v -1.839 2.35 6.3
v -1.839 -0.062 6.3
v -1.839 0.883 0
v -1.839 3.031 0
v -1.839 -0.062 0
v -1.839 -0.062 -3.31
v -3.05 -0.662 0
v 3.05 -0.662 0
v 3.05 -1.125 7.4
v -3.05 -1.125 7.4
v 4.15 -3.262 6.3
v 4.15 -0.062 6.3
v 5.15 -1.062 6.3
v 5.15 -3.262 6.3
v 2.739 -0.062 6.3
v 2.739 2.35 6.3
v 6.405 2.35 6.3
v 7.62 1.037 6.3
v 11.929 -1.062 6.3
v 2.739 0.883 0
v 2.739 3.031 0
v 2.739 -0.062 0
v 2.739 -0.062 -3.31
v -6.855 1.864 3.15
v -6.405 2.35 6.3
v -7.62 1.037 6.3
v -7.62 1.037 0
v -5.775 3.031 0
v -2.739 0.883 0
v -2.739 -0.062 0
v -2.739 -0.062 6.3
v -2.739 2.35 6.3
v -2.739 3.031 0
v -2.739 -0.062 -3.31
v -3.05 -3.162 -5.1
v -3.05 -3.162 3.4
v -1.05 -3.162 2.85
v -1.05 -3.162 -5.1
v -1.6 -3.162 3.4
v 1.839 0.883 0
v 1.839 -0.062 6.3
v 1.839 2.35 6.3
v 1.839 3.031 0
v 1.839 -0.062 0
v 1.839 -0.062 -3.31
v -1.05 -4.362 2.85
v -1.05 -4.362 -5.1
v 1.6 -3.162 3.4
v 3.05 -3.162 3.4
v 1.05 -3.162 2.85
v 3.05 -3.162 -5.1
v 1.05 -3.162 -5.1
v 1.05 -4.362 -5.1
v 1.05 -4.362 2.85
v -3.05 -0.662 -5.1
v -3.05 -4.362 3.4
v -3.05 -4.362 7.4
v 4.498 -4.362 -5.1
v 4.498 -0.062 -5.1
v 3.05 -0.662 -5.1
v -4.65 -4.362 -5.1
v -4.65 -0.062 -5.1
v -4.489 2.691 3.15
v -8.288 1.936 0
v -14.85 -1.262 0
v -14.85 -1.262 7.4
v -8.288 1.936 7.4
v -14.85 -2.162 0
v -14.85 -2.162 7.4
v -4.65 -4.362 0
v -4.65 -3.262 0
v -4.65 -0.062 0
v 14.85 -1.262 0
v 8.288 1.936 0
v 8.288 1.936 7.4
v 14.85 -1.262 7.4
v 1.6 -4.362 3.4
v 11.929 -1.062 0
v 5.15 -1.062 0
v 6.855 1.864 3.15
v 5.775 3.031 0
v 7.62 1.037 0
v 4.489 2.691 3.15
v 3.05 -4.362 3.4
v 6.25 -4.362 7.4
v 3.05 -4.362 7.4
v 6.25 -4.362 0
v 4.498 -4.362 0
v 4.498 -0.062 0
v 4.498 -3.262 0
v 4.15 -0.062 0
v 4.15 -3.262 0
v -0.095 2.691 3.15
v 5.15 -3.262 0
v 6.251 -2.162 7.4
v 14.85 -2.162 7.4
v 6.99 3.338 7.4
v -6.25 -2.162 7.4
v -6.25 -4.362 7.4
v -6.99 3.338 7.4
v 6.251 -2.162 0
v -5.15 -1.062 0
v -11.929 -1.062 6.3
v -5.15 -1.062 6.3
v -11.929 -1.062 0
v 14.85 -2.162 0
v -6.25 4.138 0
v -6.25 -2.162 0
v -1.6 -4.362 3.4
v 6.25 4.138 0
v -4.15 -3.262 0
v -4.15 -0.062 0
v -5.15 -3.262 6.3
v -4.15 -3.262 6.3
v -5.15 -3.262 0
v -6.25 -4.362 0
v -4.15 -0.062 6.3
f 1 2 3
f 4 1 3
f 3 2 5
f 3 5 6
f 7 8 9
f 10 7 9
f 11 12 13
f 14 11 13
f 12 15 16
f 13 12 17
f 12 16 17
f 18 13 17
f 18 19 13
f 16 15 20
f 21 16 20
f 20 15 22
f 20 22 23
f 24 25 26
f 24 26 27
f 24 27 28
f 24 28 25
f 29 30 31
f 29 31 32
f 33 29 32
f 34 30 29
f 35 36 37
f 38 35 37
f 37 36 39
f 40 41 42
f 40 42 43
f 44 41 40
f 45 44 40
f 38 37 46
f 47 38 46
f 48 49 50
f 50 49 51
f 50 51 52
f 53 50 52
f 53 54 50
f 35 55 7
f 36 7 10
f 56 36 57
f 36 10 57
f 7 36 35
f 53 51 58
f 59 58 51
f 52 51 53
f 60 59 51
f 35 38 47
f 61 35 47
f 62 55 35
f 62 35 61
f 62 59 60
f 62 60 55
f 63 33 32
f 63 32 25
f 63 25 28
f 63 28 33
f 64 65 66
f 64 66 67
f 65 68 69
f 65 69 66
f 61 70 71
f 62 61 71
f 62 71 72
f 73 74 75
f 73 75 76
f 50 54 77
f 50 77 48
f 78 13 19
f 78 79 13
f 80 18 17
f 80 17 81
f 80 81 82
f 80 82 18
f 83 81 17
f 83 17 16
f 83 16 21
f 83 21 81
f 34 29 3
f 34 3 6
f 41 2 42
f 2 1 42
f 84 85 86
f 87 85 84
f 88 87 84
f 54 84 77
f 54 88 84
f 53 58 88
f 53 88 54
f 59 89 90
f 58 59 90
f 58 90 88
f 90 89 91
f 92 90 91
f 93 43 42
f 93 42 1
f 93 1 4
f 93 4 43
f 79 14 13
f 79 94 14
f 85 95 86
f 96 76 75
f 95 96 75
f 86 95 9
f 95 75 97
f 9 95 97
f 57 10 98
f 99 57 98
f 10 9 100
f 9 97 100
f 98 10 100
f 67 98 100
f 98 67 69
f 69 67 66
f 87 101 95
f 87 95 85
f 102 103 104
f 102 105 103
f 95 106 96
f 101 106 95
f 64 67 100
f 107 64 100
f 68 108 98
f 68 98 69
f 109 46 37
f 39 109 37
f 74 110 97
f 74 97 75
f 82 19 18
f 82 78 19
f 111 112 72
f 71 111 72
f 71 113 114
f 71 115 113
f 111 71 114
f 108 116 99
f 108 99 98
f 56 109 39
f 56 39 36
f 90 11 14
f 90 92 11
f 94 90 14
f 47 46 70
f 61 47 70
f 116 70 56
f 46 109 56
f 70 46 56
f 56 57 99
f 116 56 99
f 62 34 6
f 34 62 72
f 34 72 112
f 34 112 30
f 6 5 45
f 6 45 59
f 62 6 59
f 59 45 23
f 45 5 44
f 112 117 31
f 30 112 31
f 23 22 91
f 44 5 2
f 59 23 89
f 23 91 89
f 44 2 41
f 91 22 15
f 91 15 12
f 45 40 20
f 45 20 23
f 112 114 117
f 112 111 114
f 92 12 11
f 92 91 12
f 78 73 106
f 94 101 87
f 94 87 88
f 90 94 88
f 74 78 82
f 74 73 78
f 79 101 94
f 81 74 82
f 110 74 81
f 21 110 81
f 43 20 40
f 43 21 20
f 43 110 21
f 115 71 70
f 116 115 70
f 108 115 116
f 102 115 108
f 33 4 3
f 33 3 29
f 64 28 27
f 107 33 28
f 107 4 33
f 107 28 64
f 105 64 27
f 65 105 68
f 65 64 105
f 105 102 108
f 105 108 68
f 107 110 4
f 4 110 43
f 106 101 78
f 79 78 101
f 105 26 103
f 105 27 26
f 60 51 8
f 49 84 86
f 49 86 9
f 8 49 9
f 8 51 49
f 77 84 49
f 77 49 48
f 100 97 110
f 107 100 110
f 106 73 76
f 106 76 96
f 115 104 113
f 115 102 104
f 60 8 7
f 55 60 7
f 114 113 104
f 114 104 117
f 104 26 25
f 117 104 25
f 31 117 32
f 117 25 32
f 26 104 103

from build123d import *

# Parameters (mm, degrees)
BOSS_EXTRUDE1_DEPTH = 7.4
CUT_EXTRUDE1_DEPTH  = 31.916943618
CHAMFER1_SIZE       = 0.5
CHAMFER1_SIZE_2     = 8
BOSS_EXTRUDE2_DEPTH = 5.1
SKETCH8_W           = 2
SKETCH8_H           = 3.4
BOSS_EXTRUDE5_DEPTH = 1.2
CHAMFER2_SIZE       = 0.55
BOSS_EXTRUDE6_REACH = 19.155
SKETCH9_W           = 0.9
SKETCH9_H           = 3.093590623
SKETCH10_W          = 0.9
SKETCH10_H          = 3.309924143
BOSS_EXTRUDE7_DEPTH = 1
CHAMFER3_SIZE       = 3.5
CHAMFER3_SIZE_2     = 1


with BuildPart() as part:
    # Sketch1 → Boss-Extrude1 (new body)
    with BuildSketch(Plane.XY):
        Polygon((-6.25, 4.137675877), (6.25, 4.137675877), (8.287698915, 1.935907694), (14.849810865, -1.262324123), (14.849810865, -2.162324123), (6.250723489, -2.162324123), (6.25, -4.362324123), (3.05, -4.362324123), (3.05, -1.162324123), (-3.05, -1.162324123), (-3.05, -4.362324123), (-6.25, -4.362324123), (-6.25, -2.162324123), (-14.849810865, -2.162324123), (-14.849810865, -1.262324123), (-8.287698915, 1.935907694), align=None)
    extrude(amount=BOSS_EXTRUDE1_DEPTH)

    # Sketch3 → Cut-Extrude1 (cut, through all)
    with BuildSketch(Plane(origin=(14.849810865, 0, 0), x_dir=(0, 0, -1), z_dir=(1, 0, 0))):
        Polygon((-7.4, 3.337675877), (0, 4.137675877), (-7.4, 4.137675877), align=None)
    extrude(amount=-CUT_EXTRUDE1_DEPTH, mode=Mode.SUBTRACT)

    # Shell1: read off the stored shape, not the designer's step
    # Shell1: loft between two sections, ruled curve by curve
    shell1_from = [
        Edge.make_line((5.15, -1.062324123, 6.3), (11.928689782, -1.062324123, 6.3)),
        Edge.make_line((-11.928689782, -1.062324123, 6.3), (-5.15, -1.062324123, 6.3)),
        Edge.make_line((11.928689782, -1.062324123, 6.3), (7.620430834, 1.037428357, 6.3)),
        Edge.make_line((7.620430834, 1.037428357, 6.3), (6.405496555, 2.350185419, 6.3)),
        Edge.make_line((-6.405496555, 2.350185419, 6.3), (-7.620430834, 1.037428357, 6.3)),
        Edge.make_line((-7.620430834, 1.037428357, 6.3), (-11.928689782, -1.062324123, 6.3)),
        Edge.make_line((-5.15, -1.062324123, 6.3), (-5.15, -3.262324123, 6.3)),
        Edge.make_line((-5.15, -3.262324123, 6.3), (-4.15, -3.262324123, 6.3)),
        Edge.make_line((4.15, -3.262324123, 6.3), (5.15, -3.262324123, 6.3)),
        Edge.make_line((-4.15, -3.262324123, 6.3), (-4.15, -0.062324123, 6.3)),
        Edge.make_line((-4.15, -0.062324123, 6.3), (4.15, -0.062324123, 6.3)),
        Edge.make_line((4.15, -0.062324123, 6.3), (4.15, -3.262324123, 6.3)),
        Edge.make_line((5.15, -3.262324123, 6.3), (5.15, -1.062324123, 6.3)),
        Edge.make_line((6.405496555, 2.350185419, 6.3), (-6.405496555, 2.350185419, 6.3)),
    ]
    shell1_to = [
        Edge.make_line((5.15, -1.062324123, 0), (11.928689782, -1.062324123, 0)),
        Edge.make_line((-11.928689782, -1.062324123, 0), (-5.15, -1.062324123, 0)),
        Edge.make_line((11.928689782, -1.062324123, 0), (7.620430834, 1.037428357, 0)),
        Edge.make_line((7.620430834, 1.037428357, 0), (5.775167626, 3.0312665, 0)),
        Edge.make_line((-5.775167626, 3.0312665, 0), (-7.620430834, 1.037428357, 0)),
        Edge.make_line((-7.620430834, 1.037428357, 0), (-11.928689782, -1.062324123, 0)),
        Edge.make_line((-5.15, -1.062324123, 0), (-5.15, -3.262324123, 0)),
        Edge.make_line((-5.15, -3.262324123, 0), (-4.15, -3.262324123, 0)),
        Edge.make_line((4.15, -3.262324123, 0), (5.15, -3.262324123, 0)),
        Edge.make_line((-4.15, -3.262324123, 0), (-4.15, -0.062324123, 0)),
        Edge.make_line((-4.15, -0.062324123, 0), (4.15, -0.062324123, 0)),
        Edge.make_line((4.15, -0.062324123, 0), (4.15, -3.262324123, 0)),
        Edge.make_line((5.15, -3.262324123, 0), (5.15, -1.062324123, 0)),
        Edge.make_line((5.775167626, 3.0312665, 0), (-5.775167626, 3.0312665, 0)),
    ]
    shell1 = Solid(Shell([*[Face.make_surface_from_curves(shell1_from[k], shell1_to[k]) for k in range(14)], Face(Wire(shell1_from)), Face(Wire(shell1_to))]))
    add(shell1, mode=Mode.SUBTRACT)

    # Chamfer1
    # the kernel refuses this chamfer: 8, 0.5 mm, written as the material it takes off along each edge
    with BuildSketch(Plane(origin=(3.05, -1.162324123, 0), x_dir=(0, 1, 0), z_dir=(-1, 0, 0))) as chamfer1_piece_1:
        Polygon((CHAMFER1_SIZE, 0), (0, -CHAMFER1_SIZE_2), (0, 0), align=None)
    extrude(amount=6.1, mode=Mode.SUBTRACT)

    # Sketch7 → Boss-Extrude2 (add)
    with BuildSketch(Plane(origin=(0, 0, 0), x_dir=(-1, 0, 0), z_dir=(0, 0, -1))):
        Polygon((-3.05, -4.362324123), (-1.05, -4.362324123), (-1.05, -3.162324123), (-3.05, -3.162324123), (-3.05, -0.662324123), (3.05, -0.662324123), (3.05, -3.162324123), (1.05, -3.162324123), (1.05, -4.362324123), (3.05, -4.362324123), (4.65, -4.362324123), (4.65, -0.062324123), (-4.497528609, -0.062324123), (-4.497528609, -4.362324123), align=None)
    extrude(amount=BOSS_EXTRUDE2_DEPTH)

    # Sketch8 → Boss-Extrude5 (add)
    with BuildSketch(Plane(origin=(0, -4.362324123, 0), x_dir=(-1, 0, 0), z_dir=(0, -1, 0))):
        with Locations((-2.05, -1.7)):
            Rectangle(SKETCH8_W, SKETCH8_H)
        with Locations((2.05, -1.7)):
            Rectangle(SKETCH8_W, SKETCH8_H)
    extrude(amount=-BOSS_EXTRUDE5_DEPTH)

    # Chamfer2
    chamfer2_edges = [part.edges().sort_by_distance(p)[0] for p in [
        (1.05, -3.762324123, 3.4),
        (-1.05, -3.762324123, 3.4),
    ]]
    chamfer(chamfer2_edges, length=CHAMFER2_SIZE)

    # Sketch9 → Boss-Extrude6 (add, up to next)
    with BuildSketch(Plane(origin=(0, 0, 0), x_dir=(-1, 0, 0), z_dir=(0, 0, -1)), mode=Mode.PRIVATE) as boss_extrude6_sk1:
        with Locations((-2.288760134, 1.484471189)):
            Rectangle(SKETCH9_W, SKETCH9_H)
    boss_extrude6_tool1 = extrude(boss_extrude6_sk1.sketch, amount=-BOSS_EXTRUDE6_REACH, mode=Mode.PRIVATE) - part.part
    # Sketch9 → Boss-Extrude6 (add, up to next)
    with BuildSketch(Plane(origin=(0, 0, 0), x_dir=(-1, 0, 0), z_dir=(0, 0, -1)), mode=Mode.PRIVATE) as boss_extrude6_sk2:
        with Locations((2.288760134, 1.484471189)):
            Rectangle(SKETCH9_W, SKETCH9_H)
    boss_extrude6_tool2 = extrude(boss_extrude6_sk2.sketch, amount=-BOSS_EXTRUDE6_REACH, mode=Mode.PRIVATE) - part.part
    add(boss_extrude6_tool1.solids().sort_by_distance((2.28876, 1.484471, 0))[0])
    add(boss_extrude6_tool2.solids().sort_by_distance((-2.28876, 1.484471, 0))[0])

    # Sketch10 → Boss-Extrude7 (add)
    with BuildSketch(Plane(origin=(0, -0.062324123, 0), x_dir=(1, 0, 0), z_dir=(0, 1, 0))):
        with Locations((2.288760134, 1.654962072)):
            Rectangle(SKETCH10_W, SKETCH10_H)
        with Locations((-2.288760134, 1.654962072)):
            Rectangle(SKETCH10_W, SKETCH10_H)
    extrude(amount=BOSS_EXTRUDE7_DEPTH)

    # Chamfer3
    # the kernel refuses this chamfer: 3.5, 1 mm, written as the material it takes off along each edge
    with BuildSketch(Plane(origin=(-11.825802237, 0.937675877, -3.309924143), x_dir=(0, 0, 1), z_dir=(1, 0, 0))) as chamfer3_piece_1_section:
        Polygon((CHAMFER3_SIZE, 0), (0, CHAMFER3_SIZE_2), (0, 0), align=None)
    chamfer3_piece_1 = extrude(amount=19.074084206, mode=Mode.PRIVATE)
    chamfer3_piece_1 = split(chamfer3_piece_1, bisect_by=Plane(origin=(-11.825802237, 0.937675877, 0), z_dir=(0, 0, -1)), keep=Keep.TOP, mode=Mode.PRIVATE)
    chamfer3_piece_1 = split(chamfer3_piece_1, bisect_by=Plane(origin=(-11.825802237, -0.062324123, -3.309924143), z_dir=(0, 1, 0)), keep=Keep.TOP, mode=Mode.PRIVATE)
    add(chamfer3_piece_1, mode=Mode.SUBTRACT)
    with BuildSketch(Plane(origin=(-7.248281969, 0.937675877, -3.309924143), x_dir=(0, 0, 1), z_dir=(1, 0, 0))) as chamfer3_piece_2_section:
        Polygon((CHAMFER3_SIZE, 0), (0, CHAMFER3_SIZE_2), (0, 0), align=None)
    chamfer3_piece_2 = extrude(amount=19.074084206, mode=Mode.PRIVATE)
    chamfer3_piece_2 = split(chamfer3_piece_2, bisect_by=Plane(origin=(-7.248281969, 0.937675877, 0), z_dir=(0, 0, -1)), keep=Keep.TOP, mode=Mode.PRIVATE)
    chamfer3_piece_2 = split(chamfer3_piece_2, bisect_by=Plane(origin=(-7.248281969, -0.062324123, -3.309924143), z_dir=(0, 1, 0)), keep=Keep.TOP, mode=Mode.PRIVATE)
    add(chamfer3_piece_2, mode=Mode.SUBTRACT)


solid = part.part
